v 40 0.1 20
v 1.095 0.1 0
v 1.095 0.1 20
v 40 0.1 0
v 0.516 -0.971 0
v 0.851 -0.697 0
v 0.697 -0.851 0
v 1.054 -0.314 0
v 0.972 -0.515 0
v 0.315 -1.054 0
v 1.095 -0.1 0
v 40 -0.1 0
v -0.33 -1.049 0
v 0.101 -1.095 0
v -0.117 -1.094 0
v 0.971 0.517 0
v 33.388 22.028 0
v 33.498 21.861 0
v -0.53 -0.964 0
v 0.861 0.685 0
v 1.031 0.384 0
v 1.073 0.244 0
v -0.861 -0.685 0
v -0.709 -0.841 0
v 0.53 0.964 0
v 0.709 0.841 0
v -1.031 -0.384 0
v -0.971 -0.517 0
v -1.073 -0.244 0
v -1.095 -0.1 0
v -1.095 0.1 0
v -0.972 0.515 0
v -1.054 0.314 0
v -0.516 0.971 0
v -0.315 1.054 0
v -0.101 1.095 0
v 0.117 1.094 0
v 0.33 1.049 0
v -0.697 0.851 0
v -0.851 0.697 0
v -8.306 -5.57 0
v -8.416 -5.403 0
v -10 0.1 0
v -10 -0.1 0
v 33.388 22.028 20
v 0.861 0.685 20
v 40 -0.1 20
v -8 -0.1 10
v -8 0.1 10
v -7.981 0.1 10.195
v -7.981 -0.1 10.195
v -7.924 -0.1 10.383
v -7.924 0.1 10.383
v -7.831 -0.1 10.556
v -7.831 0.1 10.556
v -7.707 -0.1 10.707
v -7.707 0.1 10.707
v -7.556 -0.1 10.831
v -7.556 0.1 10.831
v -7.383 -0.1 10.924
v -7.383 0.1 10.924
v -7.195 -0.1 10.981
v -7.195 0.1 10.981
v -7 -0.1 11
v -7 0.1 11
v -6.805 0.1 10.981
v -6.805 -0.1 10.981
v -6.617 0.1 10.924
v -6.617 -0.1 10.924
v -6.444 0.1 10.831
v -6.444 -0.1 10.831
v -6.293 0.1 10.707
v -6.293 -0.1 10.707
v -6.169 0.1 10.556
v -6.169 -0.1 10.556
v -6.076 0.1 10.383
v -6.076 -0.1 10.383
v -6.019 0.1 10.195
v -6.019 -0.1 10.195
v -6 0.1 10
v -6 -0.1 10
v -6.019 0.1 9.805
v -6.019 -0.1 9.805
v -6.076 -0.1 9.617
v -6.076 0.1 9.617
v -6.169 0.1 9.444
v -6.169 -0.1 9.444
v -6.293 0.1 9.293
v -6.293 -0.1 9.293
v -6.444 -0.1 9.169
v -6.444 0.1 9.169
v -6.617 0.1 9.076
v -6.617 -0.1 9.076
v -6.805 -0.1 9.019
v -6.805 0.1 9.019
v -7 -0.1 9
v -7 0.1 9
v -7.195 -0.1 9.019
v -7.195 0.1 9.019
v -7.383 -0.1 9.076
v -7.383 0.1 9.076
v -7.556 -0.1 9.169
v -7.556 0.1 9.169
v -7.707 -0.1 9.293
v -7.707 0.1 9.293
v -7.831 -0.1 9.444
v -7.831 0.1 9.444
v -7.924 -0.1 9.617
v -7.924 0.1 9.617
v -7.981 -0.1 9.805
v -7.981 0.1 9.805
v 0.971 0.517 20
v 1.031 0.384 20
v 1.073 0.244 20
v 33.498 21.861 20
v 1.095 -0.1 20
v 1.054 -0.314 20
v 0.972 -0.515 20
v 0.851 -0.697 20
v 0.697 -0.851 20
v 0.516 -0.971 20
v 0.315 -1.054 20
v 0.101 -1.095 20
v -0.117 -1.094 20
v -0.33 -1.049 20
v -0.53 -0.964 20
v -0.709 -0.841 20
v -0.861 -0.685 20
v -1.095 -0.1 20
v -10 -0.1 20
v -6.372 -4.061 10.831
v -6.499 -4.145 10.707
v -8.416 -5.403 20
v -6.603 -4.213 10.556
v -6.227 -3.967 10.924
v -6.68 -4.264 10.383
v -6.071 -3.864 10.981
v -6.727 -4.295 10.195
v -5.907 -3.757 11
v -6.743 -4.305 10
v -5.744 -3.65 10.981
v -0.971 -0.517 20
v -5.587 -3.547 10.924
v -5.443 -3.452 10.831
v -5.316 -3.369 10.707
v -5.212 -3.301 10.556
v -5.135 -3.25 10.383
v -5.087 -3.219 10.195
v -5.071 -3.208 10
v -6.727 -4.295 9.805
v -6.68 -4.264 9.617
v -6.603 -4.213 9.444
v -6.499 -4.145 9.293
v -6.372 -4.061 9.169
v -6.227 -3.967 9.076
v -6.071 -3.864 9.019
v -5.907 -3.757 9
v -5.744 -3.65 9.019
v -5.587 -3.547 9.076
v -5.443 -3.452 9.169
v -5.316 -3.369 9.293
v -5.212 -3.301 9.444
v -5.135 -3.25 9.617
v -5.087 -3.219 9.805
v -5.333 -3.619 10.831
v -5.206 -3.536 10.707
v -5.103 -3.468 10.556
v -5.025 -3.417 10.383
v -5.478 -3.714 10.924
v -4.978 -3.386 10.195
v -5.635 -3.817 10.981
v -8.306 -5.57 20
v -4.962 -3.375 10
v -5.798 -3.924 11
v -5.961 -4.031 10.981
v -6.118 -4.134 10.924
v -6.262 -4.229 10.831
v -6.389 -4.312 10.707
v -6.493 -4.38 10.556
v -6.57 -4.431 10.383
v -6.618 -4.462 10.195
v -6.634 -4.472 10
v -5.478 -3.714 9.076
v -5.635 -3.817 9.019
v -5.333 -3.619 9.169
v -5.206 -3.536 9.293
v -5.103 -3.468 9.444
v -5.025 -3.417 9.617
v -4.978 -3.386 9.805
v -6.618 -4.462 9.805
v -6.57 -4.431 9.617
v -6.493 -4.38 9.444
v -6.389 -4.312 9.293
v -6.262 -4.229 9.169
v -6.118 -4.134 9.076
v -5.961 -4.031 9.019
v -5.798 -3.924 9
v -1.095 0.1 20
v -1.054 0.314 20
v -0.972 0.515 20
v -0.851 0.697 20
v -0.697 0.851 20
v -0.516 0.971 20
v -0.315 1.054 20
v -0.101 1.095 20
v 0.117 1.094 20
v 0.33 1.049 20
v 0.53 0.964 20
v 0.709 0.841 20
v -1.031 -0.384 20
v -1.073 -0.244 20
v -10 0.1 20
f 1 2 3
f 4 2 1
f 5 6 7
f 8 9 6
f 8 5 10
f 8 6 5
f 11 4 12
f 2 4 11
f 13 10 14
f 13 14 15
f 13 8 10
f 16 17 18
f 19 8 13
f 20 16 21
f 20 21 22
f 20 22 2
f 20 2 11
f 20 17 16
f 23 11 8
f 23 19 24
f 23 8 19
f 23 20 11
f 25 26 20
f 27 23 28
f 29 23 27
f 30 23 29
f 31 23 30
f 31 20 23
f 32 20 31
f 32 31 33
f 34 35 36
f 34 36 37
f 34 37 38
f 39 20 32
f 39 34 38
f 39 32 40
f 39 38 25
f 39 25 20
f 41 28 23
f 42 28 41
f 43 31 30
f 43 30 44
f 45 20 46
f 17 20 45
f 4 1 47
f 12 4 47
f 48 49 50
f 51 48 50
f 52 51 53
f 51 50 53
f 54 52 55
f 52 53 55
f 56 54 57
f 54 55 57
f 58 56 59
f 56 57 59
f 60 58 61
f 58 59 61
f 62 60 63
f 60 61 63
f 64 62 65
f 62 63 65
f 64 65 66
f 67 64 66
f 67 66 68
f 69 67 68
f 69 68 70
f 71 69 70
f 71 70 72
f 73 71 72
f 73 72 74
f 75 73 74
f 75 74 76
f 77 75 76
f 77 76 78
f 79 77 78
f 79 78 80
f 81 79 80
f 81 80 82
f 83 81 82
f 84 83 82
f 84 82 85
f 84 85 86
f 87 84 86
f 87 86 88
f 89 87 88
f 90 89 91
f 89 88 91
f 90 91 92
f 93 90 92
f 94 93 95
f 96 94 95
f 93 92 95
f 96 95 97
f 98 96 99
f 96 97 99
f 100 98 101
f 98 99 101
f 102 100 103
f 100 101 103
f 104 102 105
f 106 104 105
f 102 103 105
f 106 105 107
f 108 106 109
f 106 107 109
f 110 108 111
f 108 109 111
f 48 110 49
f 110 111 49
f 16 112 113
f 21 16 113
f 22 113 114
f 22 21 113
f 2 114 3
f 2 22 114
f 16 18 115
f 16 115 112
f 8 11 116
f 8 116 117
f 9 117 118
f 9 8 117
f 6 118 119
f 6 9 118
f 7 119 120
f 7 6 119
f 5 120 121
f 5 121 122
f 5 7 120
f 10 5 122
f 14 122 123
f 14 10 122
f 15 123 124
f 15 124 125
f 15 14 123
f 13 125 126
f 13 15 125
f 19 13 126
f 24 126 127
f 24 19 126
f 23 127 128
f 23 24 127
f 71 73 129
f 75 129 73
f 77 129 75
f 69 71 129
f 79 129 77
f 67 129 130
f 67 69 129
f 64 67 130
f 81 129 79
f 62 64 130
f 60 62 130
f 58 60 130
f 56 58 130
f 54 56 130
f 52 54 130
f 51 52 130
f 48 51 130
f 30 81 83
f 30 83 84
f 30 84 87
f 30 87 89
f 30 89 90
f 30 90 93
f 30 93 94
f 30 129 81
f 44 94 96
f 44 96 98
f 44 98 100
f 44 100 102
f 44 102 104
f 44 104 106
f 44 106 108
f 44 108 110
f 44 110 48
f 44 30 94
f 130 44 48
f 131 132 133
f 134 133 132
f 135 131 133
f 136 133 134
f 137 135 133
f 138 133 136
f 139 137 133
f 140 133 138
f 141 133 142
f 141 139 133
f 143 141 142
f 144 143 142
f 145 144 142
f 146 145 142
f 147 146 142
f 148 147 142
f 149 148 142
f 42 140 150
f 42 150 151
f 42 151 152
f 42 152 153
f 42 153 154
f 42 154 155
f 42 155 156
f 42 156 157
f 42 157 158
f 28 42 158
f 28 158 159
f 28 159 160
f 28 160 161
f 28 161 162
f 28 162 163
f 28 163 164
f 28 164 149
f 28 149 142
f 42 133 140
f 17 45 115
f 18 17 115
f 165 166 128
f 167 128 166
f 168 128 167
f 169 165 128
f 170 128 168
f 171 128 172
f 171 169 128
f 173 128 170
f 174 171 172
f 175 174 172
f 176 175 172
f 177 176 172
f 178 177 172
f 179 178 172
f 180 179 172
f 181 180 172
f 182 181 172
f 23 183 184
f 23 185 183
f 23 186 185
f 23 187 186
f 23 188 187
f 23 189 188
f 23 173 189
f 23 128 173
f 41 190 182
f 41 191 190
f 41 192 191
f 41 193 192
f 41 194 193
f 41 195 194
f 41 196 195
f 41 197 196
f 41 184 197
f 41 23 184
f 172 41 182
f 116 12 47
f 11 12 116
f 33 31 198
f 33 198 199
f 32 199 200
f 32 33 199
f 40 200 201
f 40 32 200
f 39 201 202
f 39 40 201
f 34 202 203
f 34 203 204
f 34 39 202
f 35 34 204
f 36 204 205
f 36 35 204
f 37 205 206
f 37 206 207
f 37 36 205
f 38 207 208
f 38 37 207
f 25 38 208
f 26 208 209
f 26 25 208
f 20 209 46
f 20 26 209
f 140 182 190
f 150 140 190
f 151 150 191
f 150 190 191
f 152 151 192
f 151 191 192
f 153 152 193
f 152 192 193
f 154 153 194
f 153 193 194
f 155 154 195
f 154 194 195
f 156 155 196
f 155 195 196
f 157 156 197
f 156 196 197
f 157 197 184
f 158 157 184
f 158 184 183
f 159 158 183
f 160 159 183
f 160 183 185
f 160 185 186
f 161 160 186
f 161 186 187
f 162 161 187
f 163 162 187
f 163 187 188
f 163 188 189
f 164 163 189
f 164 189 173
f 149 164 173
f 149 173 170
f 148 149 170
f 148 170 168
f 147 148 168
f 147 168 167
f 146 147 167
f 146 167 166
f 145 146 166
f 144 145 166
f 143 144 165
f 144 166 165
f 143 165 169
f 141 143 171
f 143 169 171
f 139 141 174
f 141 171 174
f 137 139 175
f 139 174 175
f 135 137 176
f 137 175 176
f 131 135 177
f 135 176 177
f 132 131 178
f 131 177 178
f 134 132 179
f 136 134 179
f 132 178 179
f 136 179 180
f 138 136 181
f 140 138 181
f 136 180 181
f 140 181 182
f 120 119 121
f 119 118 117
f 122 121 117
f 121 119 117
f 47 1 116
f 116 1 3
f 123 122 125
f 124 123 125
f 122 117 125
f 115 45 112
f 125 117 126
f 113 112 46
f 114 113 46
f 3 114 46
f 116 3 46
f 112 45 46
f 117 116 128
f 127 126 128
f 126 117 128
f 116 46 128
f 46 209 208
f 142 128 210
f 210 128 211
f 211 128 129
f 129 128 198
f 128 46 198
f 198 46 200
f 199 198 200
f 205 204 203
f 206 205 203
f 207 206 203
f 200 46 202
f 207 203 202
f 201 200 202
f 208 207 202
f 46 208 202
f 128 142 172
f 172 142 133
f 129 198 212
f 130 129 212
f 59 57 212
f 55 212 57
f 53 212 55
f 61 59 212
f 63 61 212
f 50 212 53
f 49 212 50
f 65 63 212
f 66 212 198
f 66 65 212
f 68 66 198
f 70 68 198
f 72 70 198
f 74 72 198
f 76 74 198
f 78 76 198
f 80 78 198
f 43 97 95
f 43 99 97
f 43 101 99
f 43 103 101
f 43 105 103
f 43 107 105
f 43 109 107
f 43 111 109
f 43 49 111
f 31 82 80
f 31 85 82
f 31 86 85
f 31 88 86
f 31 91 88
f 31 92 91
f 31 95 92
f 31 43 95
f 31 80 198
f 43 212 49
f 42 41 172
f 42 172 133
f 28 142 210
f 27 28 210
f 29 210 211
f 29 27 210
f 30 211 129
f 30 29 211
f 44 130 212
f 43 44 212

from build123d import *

# Parameters (mm, degrees)
EXTRUDE_1_DEPTH          = 20
CUT_EXTRUDE_1_DEPTH      = 20
CUT_EXTRUDE_1_DEPTH_BACK = 1
CUT_EXTRUDE_2_DEPTH      = 1


with BuildPart() as part:
    # 草图1 → 凸台-拉伸1 (new body)
    with BuildSketch(Plane.XY):
        with BuildLine():
            Line((1.095445115, 0.1), (40, 0.1))
            Line((40, 0.1), (40, -0.1))
            Line((40, -0.1), (1.095445115, -0.1))
            ThreePointArc((1.095445115, -0.1), (0.314917655, -1.053957718), (-0.861015843, -0.684581418))
            Line((-0.861015843, -0.684581418), (-8.30591358, -5.569721681))
            Line((-8.30591358, -5.569721681), (-8.415635859, -5.402506186))
            Line((-8.415635859, -5.402506186), (-0.970738122, -0.517365924))
            ThreePointArc((-0.970738122, -0.517365924), (-1.053957718, -0.314917655), (-1.095445115, -0.1))
            Line((-1.095445115, -0.1), (-10, -0.1))
            Line((-10, -0.1), (-10, 0.1))
            Line((-10, 0.1), (-1.095445115, 0.1))
            ThreePointArc((-1.095445115, 0.1), (-0.314917655, 1.053957718), (0.861015843, 0.684581418))
            Line((0.861015843, 0.684581418), (33.388237738, 22.028063482))
            Line((33.388237738, 22.028063482), (33.497960016, 21.860847988))
            Line((33.497960016, 21.860847988), (0.970738122, 0.517365924))
            ThreePointArc((0.970738122, 0.517365924), (1.053957718, 0.314917655), (1.095445115, 0.1))
        make_face()
    extrude(amount=EXTRUDE_1_DEPTH)

    # 草图2 → 切除-拉伸1 (cut, two sides)
    with BuildSketch(Plane(origin=(0, 0.1, 0), x_dir=(1, 0, 0), z_dir=(0, 1, 0))) as cut_extrude_1_sk:
        with BuildLine():
            ThreePointArc((-6, -10), (-7, -9), (-8, -10))
            Line((-8, -10), (-6, -10))
        make_face()
        with BuildLine():
            Line((-6, -10), (-8, -10))
            ThreePointArc((-8, -10), (-7, -11), (-6, -10))
        make_face()
    extrude(amount=CUT_EXTRUDE_1_DEPTH, mode=Mode.SUBTRACT)
    extrude(cut_extrude_1_sk.sketch, amount=-CUT_EXTRUDE_1_DEPTH_BACK, mode=Mode.SUBTRACT)

    # 草图3 → 切除-拉伸2 (cut)
    with BuildSketch(Plane(origin=(0.054861139, -0.083607747, 0), x_dir=(0.836077472, 0.548611393, 0), z_dir=(0.548611393, -0.836077472, 0))):
        with BuildLine():
            ThreePointArc((-6, 10), (-7, 11), (-8, 10))
            Line((-8, 10), (-6, 10))
        make_face()
        with BuildLine():
            Line((-6, 10), (-8, 10))
            ThreePointArc((-8, 10), (-7, 9), (-6, 10))
        make_face()
    extrude(amount=-CUT_EXTRUDE_2_DEPTH, mode=Mode.SUBTRACT)


solid = part.part
